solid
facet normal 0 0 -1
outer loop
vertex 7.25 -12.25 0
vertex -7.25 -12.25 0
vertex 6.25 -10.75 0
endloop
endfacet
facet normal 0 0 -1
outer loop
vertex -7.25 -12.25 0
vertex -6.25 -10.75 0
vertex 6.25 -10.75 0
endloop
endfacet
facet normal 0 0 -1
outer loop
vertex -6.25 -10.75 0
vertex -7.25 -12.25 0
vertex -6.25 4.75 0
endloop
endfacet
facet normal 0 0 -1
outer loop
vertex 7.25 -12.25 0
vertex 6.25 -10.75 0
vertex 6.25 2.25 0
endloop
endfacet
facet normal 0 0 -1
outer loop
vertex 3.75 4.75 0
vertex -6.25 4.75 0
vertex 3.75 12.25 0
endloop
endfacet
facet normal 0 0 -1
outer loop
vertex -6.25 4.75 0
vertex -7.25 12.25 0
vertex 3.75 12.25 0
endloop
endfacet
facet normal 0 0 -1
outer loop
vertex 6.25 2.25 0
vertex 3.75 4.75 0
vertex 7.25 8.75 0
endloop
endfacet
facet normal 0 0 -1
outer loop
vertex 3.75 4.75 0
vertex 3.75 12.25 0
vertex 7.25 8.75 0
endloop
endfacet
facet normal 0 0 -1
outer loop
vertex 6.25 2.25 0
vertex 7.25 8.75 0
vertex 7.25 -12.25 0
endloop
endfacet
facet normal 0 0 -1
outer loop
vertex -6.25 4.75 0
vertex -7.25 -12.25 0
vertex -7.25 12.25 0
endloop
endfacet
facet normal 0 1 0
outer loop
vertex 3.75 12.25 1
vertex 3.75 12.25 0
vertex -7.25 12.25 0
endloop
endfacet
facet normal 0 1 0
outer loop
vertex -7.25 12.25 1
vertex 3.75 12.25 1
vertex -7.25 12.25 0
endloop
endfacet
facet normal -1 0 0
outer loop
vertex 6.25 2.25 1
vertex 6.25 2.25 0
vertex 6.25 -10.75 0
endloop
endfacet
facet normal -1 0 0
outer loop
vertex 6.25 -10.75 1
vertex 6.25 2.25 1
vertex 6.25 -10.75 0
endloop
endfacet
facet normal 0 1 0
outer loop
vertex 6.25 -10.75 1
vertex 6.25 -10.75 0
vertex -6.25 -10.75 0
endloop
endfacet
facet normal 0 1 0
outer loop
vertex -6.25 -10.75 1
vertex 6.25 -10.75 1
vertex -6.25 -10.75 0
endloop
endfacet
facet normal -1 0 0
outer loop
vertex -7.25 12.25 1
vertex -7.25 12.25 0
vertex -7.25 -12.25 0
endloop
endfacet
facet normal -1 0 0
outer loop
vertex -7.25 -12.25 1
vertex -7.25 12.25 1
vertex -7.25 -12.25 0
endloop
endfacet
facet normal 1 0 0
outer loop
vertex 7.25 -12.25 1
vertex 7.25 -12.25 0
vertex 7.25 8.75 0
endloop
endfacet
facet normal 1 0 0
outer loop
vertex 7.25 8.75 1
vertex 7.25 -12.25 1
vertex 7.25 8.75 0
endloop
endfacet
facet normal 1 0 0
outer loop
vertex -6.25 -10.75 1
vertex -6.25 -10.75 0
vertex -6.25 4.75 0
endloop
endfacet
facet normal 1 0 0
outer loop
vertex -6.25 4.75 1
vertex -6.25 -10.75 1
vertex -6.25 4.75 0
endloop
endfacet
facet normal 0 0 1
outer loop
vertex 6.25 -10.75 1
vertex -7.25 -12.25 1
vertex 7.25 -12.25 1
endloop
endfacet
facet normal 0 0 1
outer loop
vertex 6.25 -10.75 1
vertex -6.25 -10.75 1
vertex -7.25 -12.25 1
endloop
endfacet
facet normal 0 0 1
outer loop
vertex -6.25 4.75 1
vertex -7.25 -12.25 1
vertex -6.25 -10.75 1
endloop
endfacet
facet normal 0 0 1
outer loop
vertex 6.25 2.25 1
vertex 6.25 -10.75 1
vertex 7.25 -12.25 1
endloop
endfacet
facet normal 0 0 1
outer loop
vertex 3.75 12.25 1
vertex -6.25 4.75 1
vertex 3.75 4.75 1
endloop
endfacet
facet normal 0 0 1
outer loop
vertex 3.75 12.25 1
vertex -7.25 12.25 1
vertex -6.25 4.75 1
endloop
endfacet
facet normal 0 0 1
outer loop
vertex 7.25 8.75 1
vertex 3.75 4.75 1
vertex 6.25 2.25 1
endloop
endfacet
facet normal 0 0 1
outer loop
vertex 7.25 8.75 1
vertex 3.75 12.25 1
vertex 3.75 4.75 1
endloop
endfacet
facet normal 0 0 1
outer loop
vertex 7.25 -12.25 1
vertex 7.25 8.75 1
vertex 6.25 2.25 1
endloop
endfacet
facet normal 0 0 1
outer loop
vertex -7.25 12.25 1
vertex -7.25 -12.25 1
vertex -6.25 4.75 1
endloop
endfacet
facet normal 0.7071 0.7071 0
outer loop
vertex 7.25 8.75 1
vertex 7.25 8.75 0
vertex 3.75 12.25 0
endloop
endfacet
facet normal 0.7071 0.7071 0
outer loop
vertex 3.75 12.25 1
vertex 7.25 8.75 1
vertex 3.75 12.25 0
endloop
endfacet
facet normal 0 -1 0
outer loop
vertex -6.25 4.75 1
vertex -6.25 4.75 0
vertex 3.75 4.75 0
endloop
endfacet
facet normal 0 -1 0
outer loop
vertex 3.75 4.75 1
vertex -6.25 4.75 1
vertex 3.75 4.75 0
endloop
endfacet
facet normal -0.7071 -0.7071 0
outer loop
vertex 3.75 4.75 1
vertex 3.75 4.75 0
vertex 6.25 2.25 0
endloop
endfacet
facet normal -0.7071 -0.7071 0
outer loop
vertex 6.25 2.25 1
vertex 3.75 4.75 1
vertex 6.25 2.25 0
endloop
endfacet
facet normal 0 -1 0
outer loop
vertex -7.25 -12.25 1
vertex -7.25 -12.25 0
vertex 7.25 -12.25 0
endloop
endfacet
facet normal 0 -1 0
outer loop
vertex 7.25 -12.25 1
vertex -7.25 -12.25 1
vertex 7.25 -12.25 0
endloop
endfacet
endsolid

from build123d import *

# Parameters (mm, degrees)
F1_DEPTH = 1


with BuildPart() as f1:
    # F0 (on Top) → F1 (new body)
    with BuildSketch(Plane.XY):
        Polygon((-7.25, -12.25), (7.25, -12.25), (7.25, 8.75), (3.75, 12.25), (-7.25, 12.25), align=None)
        Polygon((6.25, 2.25), (6.25, -10.75), (-6.25, -10.75), (-6.25, 4.75), (3.75, 4.75), align=None, mode=Mode.SUBTRACT)
    extrude(amount=F1_DEPTH)


solid = f1.part
